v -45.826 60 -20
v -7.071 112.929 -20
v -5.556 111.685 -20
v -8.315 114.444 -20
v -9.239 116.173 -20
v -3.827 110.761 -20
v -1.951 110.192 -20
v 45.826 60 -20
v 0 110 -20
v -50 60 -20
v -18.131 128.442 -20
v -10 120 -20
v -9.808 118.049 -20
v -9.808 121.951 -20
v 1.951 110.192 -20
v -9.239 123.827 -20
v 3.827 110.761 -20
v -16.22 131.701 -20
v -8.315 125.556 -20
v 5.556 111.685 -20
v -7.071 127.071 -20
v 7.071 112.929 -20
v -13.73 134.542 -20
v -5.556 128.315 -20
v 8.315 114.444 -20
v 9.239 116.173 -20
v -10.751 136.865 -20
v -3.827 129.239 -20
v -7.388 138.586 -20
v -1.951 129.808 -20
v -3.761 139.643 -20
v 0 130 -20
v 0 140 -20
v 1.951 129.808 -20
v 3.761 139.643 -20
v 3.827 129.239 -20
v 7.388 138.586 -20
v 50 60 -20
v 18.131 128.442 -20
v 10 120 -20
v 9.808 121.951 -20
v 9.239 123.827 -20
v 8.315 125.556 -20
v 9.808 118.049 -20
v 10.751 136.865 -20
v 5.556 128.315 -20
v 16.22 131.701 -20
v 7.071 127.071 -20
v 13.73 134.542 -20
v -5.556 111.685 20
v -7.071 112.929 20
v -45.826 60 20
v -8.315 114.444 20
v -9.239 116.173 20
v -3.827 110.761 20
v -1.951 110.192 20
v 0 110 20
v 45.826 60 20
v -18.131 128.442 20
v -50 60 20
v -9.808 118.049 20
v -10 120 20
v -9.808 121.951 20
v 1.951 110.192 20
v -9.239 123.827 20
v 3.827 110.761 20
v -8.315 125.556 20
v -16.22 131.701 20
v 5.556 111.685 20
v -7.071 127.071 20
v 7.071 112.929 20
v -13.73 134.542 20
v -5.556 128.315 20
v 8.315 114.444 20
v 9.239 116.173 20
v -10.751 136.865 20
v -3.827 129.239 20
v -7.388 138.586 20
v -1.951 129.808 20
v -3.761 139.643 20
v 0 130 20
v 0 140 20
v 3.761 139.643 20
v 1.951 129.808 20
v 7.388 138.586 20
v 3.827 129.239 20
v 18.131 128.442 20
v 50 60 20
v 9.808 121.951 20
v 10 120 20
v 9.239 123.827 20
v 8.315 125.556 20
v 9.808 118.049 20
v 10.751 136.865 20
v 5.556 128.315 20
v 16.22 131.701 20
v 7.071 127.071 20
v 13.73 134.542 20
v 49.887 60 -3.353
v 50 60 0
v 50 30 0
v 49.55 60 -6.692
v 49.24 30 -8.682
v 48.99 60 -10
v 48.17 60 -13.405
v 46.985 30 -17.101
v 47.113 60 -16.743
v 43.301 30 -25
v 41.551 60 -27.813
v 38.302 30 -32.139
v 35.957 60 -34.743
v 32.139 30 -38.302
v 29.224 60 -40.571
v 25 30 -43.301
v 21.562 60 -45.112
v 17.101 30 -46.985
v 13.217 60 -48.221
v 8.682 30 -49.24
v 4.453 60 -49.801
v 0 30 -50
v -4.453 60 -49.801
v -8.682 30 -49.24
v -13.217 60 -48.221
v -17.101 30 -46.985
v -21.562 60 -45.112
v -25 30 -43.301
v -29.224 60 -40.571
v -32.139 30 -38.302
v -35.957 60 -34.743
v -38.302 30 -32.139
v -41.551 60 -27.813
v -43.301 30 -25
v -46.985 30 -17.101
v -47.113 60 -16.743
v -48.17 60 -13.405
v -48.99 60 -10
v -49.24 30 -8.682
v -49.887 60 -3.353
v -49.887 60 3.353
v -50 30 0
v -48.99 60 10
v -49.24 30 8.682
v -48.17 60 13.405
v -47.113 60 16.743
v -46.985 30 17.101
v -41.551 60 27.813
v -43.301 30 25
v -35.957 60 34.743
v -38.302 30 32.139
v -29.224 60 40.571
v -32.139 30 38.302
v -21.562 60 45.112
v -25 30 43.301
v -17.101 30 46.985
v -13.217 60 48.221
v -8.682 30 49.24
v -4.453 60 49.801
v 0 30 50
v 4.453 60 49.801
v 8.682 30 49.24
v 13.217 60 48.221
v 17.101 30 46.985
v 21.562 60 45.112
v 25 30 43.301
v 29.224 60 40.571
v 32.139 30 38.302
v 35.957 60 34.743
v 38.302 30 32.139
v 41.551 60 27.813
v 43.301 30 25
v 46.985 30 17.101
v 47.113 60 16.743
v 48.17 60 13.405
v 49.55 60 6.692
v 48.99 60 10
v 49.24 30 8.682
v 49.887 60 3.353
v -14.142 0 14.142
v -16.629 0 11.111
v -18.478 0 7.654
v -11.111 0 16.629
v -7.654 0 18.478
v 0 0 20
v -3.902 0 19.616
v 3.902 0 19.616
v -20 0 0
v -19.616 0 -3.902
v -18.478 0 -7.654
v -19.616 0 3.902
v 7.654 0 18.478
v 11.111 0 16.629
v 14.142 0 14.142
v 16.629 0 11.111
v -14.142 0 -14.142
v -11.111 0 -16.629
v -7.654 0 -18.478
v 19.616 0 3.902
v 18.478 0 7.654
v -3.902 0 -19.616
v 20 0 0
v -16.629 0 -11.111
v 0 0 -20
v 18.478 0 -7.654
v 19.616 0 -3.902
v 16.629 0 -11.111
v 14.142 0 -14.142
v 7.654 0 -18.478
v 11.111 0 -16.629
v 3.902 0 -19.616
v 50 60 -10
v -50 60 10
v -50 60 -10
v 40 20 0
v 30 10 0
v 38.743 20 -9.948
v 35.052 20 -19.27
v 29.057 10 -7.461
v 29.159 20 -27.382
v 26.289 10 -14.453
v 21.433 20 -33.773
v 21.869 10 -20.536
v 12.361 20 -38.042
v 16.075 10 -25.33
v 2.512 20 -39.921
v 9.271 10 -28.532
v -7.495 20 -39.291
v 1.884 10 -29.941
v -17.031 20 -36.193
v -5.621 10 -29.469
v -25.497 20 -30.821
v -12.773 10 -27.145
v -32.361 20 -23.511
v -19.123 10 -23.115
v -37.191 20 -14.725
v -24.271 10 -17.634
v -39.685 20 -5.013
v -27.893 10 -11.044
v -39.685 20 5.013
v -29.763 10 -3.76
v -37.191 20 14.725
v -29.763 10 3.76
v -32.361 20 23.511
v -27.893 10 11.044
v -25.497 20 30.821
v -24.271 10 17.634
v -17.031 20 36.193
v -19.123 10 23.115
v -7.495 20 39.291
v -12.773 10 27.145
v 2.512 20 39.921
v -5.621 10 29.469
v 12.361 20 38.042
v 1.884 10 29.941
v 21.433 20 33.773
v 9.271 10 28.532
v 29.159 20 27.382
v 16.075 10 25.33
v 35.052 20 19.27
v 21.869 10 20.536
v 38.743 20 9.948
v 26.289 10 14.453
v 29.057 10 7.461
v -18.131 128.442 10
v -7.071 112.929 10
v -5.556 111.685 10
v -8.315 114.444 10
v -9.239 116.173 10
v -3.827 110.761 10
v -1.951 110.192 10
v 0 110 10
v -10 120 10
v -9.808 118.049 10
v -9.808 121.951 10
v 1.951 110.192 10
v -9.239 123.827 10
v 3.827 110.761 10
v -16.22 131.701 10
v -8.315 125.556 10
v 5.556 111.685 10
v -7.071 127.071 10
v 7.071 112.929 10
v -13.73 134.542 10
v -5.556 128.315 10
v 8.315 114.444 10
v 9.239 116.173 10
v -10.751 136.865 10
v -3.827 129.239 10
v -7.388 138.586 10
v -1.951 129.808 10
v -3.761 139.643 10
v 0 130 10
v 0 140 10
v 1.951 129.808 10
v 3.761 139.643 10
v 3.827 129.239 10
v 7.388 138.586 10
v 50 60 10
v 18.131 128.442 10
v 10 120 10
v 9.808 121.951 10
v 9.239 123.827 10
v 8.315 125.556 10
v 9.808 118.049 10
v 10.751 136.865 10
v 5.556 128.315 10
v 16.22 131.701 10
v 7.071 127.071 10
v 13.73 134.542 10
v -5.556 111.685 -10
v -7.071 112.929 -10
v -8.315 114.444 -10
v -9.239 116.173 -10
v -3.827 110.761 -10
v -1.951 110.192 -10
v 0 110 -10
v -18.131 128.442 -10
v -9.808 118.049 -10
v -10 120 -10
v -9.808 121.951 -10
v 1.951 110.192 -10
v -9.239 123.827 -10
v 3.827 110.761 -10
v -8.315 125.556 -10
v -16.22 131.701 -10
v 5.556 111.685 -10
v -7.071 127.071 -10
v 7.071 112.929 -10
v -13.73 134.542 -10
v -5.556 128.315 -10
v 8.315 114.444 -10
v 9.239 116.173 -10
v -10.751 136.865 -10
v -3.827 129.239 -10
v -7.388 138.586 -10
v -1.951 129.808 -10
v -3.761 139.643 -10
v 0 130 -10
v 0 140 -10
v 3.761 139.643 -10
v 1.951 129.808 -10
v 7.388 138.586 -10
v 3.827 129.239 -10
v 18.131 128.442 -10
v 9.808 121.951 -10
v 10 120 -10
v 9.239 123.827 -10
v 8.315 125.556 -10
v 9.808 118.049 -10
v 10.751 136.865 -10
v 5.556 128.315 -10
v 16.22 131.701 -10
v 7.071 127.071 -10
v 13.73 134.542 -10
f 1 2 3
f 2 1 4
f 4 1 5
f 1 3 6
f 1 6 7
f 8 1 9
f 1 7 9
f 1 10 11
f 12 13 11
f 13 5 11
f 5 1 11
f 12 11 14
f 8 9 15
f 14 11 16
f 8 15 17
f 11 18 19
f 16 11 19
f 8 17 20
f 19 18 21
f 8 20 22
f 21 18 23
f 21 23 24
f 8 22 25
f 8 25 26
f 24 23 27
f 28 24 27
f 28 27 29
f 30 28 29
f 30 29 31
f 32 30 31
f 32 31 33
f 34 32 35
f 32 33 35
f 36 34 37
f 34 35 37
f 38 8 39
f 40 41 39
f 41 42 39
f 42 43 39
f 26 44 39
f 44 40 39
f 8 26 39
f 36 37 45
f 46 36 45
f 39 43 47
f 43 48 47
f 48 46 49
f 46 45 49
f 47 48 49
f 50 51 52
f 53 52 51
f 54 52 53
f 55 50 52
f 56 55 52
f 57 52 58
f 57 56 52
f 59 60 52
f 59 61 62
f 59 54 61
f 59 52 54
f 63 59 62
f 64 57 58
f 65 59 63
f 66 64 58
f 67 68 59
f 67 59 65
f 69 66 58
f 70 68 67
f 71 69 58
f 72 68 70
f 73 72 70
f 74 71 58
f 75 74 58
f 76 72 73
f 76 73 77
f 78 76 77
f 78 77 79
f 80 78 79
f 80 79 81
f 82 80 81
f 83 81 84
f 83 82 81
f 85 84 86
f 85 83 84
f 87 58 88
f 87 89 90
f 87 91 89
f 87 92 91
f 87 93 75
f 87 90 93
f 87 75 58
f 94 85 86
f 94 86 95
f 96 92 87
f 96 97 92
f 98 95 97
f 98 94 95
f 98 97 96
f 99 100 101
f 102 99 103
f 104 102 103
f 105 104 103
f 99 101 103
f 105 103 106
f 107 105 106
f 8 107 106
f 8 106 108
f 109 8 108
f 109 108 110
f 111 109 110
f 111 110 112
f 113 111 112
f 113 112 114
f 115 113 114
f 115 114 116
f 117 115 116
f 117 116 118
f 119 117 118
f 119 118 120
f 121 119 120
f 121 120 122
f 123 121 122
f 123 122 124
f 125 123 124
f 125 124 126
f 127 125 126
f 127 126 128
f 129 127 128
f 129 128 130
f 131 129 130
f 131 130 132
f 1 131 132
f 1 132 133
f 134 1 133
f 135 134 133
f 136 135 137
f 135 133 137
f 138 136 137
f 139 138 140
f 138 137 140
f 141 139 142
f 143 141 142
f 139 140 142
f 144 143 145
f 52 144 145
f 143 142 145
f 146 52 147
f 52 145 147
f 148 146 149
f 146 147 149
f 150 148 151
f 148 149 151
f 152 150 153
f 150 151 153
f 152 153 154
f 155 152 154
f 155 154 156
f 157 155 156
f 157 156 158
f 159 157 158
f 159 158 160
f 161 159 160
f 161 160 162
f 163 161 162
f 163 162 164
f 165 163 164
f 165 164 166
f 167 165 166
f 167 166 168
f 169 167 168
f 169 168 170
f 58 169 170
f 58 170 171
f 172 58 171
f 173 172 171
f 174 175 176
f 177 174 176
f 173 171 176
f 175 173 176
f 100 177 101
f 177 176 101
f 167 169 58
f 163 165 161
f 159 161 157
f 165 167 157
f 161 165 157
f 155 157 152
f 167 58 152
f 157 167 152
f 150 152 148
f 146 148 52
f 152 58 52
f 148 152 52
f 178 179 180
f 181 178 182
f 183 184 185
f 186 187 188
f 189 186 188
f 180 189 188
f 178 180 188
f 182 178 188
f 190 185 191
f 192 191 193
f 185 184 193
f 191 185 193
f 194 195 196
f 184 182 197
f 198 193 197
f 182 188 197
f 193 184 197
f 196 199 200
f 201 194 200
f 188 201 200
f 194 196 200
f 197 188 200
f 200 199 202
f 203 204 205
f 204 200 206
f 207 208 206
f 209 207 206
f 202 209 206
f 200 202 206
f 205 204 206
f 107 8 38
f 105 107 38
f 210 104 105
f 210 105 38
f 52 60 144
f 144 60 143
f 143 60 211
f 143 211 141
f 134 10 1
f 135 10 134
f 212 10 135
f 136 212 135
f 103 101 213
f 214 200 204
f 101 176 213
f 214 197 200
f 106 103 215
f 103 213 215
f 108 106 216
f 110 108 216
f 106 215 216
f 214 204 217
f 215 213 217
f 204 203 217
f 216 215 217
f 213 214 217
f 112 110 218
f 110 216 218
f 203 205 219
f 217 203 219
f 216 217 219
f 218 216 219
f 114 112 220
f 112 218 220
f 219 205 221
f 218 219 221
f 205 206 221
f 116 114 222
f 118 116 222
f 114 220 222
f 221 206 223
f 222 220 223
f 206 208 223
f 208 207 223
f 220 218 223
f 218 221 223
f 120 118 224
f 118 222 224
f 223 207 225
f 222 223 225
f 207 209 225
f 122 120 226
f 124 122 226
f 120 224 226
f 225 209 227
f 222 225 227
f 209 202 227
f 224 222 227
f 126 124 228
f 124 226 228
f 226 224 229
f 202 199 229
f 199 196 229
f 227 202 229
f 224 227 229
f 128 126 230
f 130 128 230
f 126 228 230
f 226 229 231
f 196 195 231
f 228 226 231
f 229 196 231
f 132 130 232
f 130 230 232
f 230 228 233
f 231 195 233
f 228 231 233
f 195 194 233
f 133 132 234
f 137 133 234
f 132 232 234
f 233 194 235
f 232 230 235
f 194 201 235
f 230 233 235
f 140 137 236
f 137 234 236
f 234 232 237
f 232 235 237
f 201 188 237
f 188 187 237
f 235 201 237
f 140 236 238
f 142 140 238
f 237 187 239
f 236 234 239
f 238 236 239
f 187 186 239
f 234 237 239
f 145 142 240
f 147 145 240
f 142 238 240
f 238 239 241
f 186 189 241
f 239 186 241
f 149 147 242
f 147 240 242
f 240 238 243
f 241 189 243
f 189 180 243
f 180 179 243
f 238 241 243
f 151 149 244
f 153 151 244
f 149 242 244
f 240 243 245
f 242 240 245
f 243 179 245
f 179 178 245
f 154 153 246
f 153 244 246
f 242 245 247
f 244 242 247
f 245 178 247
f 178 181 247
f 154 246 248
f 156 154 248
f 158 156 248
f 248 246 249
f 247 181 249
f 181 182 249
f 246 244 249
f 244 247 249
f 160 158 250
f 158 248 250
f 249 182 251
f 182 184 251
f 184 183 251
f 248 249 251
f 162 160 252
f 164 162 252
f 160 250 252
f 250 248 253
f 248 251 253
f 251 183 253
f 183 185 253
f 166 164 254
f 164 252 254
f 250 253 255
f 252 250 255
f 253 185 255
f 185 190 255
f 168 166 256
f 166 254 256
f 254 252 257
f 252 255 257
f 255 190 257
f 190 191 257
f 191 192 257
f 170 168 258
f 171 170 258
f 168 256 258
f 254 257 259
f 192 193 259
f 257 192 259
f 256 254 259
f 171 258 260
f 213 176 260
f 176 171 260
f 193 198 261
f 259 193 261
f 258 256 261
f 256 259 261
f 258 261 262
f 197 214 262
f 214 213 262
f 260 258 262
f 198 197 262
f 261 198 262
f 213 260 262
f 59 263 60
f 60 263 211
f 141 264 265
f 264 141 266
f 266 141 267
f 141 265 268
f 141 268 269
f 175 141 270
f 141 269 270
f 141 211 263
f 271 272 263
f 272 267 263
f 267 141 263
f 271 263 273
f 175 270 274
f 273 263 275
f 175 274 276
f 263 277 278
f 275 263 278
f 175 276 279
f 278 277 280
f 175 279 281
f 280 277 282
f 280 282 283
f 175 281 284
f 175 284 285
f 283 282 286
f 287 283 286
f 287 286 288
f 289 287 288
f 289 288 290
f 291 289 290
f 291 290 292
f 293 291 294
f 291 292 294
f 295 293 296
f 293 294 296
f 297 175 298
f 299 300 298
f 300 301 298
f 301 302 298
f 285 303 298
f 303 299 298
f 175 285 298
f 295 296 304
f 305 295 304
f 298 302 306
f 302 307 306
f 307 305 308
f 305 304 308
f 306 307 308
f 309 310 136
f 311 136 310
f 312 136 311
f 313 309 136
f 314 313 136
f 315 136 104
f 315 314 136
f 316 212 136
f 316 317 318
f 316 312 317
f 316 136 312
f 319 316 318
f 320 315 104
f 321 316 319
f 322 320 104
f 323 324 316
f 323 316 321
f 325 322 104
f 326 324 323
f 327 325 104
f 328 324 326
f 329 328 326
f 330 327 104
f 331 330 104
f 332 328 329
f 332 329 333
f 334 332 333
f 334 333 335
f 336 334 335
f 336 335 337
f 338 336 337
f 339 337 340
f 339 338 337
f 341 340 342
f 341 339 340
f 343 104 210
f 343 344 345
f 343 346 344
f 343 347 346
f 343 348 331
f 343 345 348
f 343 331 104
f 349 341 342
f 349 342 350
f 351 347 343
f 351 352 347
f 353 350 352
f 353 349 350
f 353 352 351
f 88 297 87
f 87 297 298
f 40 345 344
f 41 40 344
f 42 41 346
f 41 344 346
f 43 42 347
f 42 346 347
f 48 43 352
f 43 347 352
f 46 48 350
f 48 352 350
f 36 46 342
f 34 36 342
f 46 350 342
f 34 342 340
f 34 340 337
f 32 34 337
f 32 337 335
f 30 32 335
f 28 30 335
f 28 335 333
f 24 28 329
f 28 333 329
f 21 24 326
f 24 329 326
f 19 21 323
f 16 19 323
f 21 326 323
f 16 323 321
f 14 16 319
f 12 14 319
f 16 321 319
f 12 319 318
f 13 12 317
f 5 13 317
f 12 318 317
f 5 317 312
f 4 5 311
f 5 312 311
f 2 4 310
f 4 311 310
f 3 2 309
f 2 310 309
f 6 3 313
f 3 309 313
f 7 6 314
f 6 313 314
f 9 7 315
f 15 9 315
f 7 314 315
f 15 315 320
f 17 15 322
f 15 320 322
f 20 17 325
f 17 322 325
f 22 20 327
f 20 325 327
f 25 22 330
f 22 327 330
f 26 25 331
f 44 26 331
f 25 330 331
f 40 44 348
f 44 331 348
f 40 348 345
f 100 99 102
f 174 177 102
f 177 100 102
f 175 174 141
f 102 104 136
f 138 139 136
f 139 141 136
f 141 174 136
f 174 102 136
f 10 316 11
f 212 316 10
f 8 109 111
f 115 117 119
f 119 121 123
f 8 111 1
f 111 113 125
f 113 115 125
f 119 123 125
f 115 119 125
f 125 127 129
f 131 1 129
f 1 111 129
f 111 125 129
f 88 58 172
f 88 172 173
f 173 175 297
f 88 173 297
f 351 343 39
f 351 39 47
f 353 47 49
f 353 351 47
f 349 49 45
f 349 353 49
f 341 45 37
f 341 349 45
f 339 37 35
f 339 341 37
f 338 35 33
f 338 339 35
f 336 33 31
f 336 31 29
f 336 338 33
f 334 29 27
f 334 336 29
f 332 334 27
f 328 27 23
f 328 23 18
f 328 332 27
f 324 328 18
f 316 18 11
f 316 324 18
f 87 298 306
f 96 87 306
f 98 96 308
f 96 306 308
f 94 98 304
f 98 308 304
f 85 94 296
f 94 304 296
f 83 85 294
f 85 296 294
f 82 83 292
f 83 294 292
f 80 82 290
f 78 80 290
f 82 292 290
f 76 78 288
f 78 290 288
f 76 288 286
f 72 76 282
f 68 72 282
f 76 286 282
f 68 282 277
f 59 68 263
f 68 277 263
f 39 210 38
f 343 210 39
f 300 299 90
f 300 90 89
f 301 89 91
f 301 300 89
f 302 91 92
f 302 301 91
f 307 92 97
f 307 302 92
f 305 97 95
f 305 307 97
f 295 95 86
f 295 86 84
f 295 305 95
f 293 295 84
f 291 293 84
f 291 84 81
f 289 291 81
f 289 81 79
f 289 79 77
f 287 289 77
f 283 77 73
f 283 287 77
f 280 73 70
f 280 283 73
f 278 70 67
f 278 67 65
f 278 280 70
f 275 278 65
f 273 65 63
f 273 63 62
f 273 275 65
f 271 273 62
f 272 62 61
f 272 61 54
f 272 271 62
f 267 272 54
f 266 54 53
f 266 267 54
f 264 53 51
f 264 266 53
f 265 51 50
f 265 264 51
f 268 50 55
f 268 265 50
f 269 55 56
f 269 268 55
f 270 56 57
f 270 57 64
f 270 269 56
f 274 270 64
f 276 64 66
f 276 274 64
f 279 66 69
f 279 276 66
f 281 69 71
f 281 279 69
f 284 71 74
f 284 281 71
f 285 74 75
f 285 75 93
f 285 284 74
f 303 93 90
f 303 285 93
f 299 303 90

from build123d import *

# Parameters (mm, degrees)
RESSALTO_EXTRUS_O1_START = 10
ESBO_O2_R                = 10
RESSALTO_EXTRUS_O1_DEPTH = 10


with BuildPart() as part:
    # Esboço1 → Revolução1 (revolve)
    with BuildSketch(Plane.XY):
        Polygon((0, 0), (0, 60), (50, 60), (50, 30), (20, 0), align=None)
    revolve(axis=Axis((0, 0, 0), (0, 1, 0)))

    # Esboço2 → Ressalto-extrusão1 (add)
    with BuildSketch(Plane.XY.offset(RESSALTO_EXTRUS_O1_START)):
        with BuildLine():
            Line((50, 60), (18.13082184, 128.442351533))
            ThreePointArc((18.13082184, 128.442351533), (0, 140), (-18.13082184, 128.442351533))
            Line((-18.13082184, 128.442351533), (-50, 60))
            Line((-50, 60), (50, 60))
        make_face()
        with Locations((0, 120)):
            Circle(ESBO_O2_R, mode=Mode.SUBTRACT)
    ressalto_extrus_o1 = extrude(amount=RESSALTO_EXTRUS_O1_DEPTH)

    # Espelhar1: Ressalto-extrusão1 across plane
    add(ressalto_extrus_o1.mirror(Plane.XY))


solid = part.part
